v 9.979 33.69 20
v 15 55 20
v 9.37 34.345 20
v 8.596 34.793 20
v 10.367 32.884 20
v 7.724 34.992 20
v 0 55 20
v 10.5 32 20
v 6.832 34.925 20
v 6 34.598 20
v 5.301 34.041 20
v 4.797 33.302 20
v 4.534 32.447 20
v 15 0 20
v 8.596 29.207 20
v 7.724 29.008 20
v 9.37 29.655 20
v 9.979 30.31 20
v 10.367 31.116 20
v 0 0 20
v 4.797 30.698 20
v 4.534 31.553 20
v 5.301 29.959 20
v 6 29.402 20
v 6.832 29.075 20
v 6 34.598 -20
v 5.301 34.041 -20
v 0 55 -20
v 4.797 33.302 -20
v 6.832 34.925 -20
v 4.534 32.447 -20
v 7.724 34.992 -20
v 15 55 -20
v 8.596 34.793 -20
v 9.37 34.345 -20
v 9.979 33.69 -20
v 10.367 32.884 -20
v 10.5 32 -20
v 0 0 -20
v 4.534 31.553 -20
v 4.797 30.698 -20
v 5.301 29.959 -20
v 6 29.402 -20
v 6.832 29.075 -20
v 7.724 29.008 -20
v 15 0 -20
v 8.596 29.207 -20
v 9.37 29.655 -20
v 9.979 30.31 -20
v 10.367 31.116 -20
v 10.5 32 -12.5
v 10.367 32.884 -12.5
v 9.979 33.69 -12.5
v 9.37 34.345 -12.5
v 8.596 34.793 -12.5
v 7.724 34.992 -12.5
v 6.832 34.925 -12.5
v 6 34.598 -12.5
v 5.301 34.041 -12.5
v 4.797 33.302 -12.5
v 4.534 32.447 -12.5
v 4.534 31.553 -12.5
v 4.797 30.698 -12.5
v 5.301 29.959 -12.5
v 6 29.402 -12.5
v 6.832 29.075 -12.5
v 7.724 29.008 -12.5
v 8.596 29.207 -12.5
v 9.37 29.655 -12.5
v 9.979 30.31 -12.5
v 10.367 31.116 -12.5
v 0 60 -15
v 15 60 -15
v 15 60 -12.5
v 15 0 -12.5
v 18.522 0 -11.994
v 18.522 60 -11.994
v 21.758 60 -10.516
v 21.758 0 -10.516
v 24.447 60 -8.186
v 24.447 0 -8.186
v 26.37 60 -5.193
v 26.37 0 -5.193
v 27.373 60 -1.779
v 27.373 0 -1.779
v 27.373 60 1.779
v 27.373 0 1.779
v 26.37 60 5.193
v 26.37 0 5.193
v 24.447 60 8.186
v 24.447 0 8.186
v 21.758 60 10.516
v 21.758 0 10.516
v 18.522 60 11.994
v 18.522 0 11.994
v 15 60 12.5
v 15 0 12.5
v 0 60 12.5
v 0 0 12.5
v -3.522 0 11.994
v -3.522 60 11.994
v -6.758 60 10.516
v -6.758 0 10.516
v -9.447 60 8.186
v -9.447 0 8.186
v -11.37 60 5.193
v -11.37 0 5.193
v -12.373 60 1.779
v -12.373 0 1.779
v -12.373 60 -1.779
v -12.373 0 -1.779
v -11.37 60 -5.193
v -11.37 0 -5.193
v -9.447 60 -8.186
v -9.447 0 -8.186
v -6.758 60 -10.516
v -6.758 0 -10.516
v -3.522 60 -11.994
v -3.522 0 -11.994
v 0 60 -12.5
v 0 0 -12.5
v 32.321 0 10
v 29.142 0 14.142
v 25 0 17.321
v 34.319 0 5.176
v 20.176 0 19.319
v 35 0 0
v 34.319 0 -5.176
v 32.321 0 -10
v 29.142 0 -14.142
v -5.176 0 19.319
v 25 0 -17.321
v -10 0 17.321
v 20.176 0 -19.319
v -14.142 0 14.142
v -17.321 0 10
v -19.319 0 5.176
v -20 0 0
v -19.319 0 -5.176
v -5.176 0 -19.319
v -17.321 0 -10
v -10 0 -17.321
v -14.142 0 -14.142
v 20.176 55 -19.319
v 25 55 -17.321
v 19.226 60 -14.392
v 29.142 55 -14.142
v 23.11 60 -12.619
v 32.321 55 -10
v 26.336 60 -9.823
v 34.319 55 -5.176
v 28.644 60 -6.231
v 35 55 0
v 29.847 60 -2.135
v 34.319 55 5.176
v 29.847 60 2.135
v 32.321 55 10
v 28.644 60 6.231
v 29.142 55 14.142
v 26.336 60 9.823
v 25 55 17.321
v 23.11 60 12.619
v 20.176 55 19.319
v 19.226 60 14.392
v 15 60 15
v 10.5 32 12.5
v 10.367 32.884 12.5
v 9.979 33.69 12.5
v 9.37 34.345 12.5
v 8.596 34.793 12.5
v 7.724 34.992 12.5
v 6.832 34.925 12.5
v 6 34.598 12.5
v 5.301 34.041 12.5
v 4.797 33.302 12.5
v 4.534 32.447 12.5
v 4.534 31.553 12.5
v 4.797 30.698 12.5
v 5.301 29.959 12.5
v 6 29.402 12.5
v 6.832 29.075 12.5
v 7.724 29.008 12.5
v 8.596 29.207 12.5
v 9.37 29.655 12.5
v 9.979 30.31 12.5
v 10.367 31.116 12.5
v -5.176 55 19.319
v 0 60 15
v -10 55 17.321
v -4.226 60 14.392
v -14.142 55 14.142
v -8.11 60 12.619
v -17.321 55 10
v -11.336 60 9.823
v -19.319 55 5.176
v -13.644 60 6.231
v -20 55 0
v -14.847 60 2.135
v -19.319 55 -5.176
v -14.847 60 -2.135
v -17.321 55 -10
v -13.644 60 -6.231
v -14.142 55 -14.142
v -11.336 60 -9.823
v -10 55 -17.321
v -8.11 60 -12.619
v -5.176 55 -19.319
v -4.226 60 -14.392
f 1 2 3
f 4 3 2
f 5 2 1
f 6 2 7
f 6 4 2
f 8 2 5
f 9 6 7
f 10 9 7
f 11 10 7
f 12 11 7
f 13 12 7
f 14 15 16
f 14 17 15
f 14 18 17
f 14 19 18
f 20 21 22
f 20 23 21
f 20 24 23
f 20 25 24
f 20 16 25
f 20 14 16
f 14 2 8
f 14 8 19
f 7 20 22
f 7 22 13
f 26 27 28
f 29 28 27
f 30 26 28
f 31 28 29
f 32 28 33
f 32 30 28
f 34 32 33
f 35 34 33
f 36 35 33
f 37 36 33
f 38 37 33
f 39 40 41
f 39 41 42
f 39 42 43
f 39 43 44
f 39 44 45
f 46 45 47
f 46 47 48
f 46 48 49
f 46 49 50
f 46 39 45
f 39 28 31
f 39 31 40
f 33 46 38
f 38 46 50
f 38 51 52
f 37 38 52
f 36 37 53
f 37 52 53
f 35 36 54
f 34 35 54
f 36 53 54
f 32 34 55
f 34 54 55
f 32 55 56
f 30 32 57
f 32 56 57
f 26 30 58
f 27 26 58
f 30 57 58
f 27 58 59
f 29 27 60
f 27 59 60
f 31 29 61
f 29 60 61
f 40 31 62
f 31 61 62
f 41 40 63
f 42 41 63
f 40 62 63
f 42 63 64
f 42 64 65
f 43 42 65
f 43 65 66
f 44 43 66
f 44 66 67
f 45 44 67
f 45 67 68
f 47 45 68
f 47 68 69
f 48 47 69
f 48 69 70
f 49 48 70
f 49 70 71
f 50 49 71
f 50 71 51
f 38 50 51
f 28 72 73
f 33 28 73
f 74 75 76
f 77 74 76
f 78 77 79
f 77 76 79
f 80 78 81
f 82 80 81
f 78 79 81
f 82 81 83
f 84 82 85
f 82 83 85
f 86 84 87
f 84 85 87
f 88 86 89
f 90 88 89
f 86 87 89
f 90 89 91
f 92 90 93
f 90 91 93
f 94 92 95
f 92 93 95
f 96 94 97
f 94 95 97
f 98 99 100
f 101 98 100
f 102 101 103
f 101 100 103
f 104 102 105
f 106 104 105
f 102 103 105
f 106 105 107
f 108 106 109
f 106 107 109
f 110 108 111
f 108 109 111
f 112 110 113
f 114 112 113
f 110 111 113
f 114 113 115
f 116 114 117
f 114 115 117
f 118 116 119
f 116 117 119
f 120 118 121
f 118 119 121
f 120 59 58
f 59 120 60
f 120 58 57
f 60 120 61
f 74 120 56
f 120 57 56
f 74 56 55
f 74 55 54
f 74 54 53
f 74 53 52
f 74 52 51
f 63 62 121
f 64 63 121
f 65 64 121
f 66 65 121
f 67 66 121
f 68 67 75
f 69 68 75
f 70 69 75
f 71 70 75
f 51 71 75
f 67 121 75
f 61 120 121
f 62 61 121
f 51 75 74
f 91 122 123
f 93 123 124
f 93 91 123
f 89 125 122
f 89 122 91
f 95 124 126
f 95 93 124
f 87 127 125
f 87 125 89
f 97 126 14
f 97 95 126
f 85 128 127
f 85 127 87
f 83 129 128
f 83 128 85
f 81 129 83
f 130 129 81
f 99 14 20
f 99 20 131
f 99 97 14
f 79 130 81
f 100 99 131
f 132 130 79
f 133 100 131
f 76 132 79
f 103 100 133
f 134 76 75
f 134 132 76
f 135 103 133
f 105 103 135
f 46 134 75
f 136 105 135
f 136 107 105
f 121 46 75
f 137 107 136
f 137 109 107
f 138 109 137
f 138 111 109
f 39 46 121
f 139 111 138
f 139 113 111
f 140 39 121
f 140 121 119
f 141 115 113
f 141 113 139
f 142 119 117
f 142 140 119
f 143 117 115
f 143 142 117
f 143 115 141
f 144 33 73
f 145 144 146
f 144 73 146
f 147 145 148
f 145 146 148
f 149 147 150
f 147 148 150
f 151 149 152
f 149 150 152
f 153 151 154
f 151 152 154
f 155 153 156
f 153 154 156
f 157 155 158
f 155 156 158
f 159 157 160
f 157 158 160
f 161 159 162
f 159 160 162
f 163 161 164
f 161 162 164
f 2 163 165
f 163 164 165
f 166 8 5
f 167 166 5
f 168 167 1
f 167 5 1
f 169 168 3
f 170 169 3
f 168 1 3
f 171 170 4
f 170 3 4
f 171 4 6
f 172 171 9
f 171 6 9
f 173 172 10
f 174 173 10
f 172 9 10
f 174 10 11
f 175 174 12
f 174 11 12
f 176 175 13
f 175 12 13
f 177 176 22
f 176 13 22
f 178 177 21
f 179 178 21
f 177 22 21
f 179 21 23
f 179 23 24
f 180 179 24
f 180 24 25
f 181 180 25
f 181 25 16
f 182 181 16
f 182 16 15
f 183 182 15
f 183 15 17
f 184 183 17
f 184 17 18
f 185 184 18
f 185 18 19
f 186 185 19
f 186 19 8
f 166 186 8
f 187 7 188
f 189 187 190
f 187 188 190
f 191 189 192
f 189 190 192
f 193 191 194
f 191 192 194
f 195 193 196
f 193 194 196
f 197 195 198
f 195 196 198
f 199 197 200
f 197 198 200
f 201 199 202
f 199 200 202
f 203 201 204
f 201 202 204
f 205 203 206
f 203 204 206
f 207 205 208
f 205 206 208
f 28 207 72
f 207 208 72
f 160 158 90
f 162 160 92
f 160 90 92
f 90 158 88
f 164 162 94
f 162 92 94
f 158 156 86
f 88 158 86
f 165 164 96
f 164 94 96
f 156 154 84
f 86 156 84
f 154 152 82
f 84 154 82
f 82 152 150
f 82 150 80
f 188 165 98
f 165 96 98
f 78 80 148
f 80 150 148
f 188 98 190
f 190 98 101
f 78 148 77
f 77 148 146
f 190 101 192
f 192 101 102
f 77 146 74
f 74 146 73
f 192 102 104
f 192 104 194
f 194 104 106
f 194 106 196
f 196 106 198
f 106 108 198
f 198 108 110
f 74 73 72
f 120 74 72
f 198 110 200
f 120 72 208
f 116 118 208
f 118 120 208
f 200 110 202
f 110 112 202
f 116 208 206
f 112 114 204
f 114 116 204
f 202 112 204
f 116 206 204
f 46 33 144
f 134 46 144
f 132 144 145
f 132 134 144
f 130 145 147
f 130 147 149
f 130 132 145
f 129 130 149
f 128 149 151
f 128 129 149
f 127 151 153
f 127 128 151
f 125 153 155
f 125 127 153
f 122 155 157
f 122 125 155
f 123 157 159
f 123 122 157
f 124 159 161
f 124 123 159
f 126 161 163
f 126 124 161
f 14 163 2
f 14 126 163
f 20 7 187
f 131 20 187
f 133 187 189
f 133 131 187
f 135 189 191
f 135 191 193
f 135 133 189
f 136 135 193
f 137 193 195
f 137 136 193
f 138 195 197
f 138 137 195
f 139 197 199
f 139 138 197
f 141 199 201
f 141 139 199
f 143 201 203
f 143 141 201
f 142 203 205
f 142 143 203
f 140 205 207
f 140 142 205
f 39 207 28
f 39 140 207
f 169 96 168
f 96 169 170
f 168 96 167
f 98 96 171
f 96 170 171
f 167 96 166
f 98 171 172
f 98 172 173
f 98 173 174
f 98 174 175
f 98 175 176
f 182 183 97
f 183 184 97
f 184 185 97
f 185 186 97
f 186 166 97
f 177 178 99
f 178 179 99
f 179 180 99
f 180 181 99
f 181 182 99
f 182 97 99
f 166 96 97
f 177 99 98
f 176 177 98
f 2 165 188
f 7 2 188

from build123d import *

# Parameters (mm, degrees)
SALIENTE_EXTRUIR1_DEPTH = 60
CHAFL_N1_SIZE           = 5
CROQUIS2_R              = 3
CORTAR_EXTRUIR1_DEPTH   = 40


with BuildPart() as part:
    # Croquis1 → Saliente-Extruir1 (new body)
    with BuildSketch(Plane(origin=(0, 0, 0), x_dir=(1, 0, 0), z_dir=(0, 1, 0))):
        with BuildLine():
            Line((0, 20), (15, 20))
            ThreePointArc((15, 20), (35, 0), (15, -20))
            Line((15, -20), (0, -20))
            ThreePointArc((0, -20), (-20, 0), (0, 20))
        make_face()
        with BuildLine():
            Line((0, 12.5), (15, 12.5))
            ThreePointArc((15, 12.5), (27.5, 0), (15, -12.5))
            Line((15, -12.5), (0, -12.5))
            ThreePointArc((0, -12.5), (-12.5, 0), (0, 12.5))
        make_face(mode=Mode.SUBTRACT)
    extrude(amount=SALIENTE_EXTRUIR1_DEPTH)

    # Chaflán1
    chafl_n1_edges = [part.edges().sort_by_distance(p)[0] for p in [
        (35, 60, 0),
        (7.5, 60, -20),
        (-20, 60, 0),
        (7.5, 60, 20),
    ]]
    chamfer(chafl_n1_edges, length=CHAFL_N1_SIZE)

    # Croquis2 → Cortar-Extruir1 (cut)
    with BuildSketch(Plane.XY.offset(20)):
        with Locations((7.5, 32)):
            Circle(CROQUIS2_R)
    extrude(amount=-CORTAR_EXTRUIR1_DEPTH, mode=Mode.SUBTRACT)


solid = part.part
